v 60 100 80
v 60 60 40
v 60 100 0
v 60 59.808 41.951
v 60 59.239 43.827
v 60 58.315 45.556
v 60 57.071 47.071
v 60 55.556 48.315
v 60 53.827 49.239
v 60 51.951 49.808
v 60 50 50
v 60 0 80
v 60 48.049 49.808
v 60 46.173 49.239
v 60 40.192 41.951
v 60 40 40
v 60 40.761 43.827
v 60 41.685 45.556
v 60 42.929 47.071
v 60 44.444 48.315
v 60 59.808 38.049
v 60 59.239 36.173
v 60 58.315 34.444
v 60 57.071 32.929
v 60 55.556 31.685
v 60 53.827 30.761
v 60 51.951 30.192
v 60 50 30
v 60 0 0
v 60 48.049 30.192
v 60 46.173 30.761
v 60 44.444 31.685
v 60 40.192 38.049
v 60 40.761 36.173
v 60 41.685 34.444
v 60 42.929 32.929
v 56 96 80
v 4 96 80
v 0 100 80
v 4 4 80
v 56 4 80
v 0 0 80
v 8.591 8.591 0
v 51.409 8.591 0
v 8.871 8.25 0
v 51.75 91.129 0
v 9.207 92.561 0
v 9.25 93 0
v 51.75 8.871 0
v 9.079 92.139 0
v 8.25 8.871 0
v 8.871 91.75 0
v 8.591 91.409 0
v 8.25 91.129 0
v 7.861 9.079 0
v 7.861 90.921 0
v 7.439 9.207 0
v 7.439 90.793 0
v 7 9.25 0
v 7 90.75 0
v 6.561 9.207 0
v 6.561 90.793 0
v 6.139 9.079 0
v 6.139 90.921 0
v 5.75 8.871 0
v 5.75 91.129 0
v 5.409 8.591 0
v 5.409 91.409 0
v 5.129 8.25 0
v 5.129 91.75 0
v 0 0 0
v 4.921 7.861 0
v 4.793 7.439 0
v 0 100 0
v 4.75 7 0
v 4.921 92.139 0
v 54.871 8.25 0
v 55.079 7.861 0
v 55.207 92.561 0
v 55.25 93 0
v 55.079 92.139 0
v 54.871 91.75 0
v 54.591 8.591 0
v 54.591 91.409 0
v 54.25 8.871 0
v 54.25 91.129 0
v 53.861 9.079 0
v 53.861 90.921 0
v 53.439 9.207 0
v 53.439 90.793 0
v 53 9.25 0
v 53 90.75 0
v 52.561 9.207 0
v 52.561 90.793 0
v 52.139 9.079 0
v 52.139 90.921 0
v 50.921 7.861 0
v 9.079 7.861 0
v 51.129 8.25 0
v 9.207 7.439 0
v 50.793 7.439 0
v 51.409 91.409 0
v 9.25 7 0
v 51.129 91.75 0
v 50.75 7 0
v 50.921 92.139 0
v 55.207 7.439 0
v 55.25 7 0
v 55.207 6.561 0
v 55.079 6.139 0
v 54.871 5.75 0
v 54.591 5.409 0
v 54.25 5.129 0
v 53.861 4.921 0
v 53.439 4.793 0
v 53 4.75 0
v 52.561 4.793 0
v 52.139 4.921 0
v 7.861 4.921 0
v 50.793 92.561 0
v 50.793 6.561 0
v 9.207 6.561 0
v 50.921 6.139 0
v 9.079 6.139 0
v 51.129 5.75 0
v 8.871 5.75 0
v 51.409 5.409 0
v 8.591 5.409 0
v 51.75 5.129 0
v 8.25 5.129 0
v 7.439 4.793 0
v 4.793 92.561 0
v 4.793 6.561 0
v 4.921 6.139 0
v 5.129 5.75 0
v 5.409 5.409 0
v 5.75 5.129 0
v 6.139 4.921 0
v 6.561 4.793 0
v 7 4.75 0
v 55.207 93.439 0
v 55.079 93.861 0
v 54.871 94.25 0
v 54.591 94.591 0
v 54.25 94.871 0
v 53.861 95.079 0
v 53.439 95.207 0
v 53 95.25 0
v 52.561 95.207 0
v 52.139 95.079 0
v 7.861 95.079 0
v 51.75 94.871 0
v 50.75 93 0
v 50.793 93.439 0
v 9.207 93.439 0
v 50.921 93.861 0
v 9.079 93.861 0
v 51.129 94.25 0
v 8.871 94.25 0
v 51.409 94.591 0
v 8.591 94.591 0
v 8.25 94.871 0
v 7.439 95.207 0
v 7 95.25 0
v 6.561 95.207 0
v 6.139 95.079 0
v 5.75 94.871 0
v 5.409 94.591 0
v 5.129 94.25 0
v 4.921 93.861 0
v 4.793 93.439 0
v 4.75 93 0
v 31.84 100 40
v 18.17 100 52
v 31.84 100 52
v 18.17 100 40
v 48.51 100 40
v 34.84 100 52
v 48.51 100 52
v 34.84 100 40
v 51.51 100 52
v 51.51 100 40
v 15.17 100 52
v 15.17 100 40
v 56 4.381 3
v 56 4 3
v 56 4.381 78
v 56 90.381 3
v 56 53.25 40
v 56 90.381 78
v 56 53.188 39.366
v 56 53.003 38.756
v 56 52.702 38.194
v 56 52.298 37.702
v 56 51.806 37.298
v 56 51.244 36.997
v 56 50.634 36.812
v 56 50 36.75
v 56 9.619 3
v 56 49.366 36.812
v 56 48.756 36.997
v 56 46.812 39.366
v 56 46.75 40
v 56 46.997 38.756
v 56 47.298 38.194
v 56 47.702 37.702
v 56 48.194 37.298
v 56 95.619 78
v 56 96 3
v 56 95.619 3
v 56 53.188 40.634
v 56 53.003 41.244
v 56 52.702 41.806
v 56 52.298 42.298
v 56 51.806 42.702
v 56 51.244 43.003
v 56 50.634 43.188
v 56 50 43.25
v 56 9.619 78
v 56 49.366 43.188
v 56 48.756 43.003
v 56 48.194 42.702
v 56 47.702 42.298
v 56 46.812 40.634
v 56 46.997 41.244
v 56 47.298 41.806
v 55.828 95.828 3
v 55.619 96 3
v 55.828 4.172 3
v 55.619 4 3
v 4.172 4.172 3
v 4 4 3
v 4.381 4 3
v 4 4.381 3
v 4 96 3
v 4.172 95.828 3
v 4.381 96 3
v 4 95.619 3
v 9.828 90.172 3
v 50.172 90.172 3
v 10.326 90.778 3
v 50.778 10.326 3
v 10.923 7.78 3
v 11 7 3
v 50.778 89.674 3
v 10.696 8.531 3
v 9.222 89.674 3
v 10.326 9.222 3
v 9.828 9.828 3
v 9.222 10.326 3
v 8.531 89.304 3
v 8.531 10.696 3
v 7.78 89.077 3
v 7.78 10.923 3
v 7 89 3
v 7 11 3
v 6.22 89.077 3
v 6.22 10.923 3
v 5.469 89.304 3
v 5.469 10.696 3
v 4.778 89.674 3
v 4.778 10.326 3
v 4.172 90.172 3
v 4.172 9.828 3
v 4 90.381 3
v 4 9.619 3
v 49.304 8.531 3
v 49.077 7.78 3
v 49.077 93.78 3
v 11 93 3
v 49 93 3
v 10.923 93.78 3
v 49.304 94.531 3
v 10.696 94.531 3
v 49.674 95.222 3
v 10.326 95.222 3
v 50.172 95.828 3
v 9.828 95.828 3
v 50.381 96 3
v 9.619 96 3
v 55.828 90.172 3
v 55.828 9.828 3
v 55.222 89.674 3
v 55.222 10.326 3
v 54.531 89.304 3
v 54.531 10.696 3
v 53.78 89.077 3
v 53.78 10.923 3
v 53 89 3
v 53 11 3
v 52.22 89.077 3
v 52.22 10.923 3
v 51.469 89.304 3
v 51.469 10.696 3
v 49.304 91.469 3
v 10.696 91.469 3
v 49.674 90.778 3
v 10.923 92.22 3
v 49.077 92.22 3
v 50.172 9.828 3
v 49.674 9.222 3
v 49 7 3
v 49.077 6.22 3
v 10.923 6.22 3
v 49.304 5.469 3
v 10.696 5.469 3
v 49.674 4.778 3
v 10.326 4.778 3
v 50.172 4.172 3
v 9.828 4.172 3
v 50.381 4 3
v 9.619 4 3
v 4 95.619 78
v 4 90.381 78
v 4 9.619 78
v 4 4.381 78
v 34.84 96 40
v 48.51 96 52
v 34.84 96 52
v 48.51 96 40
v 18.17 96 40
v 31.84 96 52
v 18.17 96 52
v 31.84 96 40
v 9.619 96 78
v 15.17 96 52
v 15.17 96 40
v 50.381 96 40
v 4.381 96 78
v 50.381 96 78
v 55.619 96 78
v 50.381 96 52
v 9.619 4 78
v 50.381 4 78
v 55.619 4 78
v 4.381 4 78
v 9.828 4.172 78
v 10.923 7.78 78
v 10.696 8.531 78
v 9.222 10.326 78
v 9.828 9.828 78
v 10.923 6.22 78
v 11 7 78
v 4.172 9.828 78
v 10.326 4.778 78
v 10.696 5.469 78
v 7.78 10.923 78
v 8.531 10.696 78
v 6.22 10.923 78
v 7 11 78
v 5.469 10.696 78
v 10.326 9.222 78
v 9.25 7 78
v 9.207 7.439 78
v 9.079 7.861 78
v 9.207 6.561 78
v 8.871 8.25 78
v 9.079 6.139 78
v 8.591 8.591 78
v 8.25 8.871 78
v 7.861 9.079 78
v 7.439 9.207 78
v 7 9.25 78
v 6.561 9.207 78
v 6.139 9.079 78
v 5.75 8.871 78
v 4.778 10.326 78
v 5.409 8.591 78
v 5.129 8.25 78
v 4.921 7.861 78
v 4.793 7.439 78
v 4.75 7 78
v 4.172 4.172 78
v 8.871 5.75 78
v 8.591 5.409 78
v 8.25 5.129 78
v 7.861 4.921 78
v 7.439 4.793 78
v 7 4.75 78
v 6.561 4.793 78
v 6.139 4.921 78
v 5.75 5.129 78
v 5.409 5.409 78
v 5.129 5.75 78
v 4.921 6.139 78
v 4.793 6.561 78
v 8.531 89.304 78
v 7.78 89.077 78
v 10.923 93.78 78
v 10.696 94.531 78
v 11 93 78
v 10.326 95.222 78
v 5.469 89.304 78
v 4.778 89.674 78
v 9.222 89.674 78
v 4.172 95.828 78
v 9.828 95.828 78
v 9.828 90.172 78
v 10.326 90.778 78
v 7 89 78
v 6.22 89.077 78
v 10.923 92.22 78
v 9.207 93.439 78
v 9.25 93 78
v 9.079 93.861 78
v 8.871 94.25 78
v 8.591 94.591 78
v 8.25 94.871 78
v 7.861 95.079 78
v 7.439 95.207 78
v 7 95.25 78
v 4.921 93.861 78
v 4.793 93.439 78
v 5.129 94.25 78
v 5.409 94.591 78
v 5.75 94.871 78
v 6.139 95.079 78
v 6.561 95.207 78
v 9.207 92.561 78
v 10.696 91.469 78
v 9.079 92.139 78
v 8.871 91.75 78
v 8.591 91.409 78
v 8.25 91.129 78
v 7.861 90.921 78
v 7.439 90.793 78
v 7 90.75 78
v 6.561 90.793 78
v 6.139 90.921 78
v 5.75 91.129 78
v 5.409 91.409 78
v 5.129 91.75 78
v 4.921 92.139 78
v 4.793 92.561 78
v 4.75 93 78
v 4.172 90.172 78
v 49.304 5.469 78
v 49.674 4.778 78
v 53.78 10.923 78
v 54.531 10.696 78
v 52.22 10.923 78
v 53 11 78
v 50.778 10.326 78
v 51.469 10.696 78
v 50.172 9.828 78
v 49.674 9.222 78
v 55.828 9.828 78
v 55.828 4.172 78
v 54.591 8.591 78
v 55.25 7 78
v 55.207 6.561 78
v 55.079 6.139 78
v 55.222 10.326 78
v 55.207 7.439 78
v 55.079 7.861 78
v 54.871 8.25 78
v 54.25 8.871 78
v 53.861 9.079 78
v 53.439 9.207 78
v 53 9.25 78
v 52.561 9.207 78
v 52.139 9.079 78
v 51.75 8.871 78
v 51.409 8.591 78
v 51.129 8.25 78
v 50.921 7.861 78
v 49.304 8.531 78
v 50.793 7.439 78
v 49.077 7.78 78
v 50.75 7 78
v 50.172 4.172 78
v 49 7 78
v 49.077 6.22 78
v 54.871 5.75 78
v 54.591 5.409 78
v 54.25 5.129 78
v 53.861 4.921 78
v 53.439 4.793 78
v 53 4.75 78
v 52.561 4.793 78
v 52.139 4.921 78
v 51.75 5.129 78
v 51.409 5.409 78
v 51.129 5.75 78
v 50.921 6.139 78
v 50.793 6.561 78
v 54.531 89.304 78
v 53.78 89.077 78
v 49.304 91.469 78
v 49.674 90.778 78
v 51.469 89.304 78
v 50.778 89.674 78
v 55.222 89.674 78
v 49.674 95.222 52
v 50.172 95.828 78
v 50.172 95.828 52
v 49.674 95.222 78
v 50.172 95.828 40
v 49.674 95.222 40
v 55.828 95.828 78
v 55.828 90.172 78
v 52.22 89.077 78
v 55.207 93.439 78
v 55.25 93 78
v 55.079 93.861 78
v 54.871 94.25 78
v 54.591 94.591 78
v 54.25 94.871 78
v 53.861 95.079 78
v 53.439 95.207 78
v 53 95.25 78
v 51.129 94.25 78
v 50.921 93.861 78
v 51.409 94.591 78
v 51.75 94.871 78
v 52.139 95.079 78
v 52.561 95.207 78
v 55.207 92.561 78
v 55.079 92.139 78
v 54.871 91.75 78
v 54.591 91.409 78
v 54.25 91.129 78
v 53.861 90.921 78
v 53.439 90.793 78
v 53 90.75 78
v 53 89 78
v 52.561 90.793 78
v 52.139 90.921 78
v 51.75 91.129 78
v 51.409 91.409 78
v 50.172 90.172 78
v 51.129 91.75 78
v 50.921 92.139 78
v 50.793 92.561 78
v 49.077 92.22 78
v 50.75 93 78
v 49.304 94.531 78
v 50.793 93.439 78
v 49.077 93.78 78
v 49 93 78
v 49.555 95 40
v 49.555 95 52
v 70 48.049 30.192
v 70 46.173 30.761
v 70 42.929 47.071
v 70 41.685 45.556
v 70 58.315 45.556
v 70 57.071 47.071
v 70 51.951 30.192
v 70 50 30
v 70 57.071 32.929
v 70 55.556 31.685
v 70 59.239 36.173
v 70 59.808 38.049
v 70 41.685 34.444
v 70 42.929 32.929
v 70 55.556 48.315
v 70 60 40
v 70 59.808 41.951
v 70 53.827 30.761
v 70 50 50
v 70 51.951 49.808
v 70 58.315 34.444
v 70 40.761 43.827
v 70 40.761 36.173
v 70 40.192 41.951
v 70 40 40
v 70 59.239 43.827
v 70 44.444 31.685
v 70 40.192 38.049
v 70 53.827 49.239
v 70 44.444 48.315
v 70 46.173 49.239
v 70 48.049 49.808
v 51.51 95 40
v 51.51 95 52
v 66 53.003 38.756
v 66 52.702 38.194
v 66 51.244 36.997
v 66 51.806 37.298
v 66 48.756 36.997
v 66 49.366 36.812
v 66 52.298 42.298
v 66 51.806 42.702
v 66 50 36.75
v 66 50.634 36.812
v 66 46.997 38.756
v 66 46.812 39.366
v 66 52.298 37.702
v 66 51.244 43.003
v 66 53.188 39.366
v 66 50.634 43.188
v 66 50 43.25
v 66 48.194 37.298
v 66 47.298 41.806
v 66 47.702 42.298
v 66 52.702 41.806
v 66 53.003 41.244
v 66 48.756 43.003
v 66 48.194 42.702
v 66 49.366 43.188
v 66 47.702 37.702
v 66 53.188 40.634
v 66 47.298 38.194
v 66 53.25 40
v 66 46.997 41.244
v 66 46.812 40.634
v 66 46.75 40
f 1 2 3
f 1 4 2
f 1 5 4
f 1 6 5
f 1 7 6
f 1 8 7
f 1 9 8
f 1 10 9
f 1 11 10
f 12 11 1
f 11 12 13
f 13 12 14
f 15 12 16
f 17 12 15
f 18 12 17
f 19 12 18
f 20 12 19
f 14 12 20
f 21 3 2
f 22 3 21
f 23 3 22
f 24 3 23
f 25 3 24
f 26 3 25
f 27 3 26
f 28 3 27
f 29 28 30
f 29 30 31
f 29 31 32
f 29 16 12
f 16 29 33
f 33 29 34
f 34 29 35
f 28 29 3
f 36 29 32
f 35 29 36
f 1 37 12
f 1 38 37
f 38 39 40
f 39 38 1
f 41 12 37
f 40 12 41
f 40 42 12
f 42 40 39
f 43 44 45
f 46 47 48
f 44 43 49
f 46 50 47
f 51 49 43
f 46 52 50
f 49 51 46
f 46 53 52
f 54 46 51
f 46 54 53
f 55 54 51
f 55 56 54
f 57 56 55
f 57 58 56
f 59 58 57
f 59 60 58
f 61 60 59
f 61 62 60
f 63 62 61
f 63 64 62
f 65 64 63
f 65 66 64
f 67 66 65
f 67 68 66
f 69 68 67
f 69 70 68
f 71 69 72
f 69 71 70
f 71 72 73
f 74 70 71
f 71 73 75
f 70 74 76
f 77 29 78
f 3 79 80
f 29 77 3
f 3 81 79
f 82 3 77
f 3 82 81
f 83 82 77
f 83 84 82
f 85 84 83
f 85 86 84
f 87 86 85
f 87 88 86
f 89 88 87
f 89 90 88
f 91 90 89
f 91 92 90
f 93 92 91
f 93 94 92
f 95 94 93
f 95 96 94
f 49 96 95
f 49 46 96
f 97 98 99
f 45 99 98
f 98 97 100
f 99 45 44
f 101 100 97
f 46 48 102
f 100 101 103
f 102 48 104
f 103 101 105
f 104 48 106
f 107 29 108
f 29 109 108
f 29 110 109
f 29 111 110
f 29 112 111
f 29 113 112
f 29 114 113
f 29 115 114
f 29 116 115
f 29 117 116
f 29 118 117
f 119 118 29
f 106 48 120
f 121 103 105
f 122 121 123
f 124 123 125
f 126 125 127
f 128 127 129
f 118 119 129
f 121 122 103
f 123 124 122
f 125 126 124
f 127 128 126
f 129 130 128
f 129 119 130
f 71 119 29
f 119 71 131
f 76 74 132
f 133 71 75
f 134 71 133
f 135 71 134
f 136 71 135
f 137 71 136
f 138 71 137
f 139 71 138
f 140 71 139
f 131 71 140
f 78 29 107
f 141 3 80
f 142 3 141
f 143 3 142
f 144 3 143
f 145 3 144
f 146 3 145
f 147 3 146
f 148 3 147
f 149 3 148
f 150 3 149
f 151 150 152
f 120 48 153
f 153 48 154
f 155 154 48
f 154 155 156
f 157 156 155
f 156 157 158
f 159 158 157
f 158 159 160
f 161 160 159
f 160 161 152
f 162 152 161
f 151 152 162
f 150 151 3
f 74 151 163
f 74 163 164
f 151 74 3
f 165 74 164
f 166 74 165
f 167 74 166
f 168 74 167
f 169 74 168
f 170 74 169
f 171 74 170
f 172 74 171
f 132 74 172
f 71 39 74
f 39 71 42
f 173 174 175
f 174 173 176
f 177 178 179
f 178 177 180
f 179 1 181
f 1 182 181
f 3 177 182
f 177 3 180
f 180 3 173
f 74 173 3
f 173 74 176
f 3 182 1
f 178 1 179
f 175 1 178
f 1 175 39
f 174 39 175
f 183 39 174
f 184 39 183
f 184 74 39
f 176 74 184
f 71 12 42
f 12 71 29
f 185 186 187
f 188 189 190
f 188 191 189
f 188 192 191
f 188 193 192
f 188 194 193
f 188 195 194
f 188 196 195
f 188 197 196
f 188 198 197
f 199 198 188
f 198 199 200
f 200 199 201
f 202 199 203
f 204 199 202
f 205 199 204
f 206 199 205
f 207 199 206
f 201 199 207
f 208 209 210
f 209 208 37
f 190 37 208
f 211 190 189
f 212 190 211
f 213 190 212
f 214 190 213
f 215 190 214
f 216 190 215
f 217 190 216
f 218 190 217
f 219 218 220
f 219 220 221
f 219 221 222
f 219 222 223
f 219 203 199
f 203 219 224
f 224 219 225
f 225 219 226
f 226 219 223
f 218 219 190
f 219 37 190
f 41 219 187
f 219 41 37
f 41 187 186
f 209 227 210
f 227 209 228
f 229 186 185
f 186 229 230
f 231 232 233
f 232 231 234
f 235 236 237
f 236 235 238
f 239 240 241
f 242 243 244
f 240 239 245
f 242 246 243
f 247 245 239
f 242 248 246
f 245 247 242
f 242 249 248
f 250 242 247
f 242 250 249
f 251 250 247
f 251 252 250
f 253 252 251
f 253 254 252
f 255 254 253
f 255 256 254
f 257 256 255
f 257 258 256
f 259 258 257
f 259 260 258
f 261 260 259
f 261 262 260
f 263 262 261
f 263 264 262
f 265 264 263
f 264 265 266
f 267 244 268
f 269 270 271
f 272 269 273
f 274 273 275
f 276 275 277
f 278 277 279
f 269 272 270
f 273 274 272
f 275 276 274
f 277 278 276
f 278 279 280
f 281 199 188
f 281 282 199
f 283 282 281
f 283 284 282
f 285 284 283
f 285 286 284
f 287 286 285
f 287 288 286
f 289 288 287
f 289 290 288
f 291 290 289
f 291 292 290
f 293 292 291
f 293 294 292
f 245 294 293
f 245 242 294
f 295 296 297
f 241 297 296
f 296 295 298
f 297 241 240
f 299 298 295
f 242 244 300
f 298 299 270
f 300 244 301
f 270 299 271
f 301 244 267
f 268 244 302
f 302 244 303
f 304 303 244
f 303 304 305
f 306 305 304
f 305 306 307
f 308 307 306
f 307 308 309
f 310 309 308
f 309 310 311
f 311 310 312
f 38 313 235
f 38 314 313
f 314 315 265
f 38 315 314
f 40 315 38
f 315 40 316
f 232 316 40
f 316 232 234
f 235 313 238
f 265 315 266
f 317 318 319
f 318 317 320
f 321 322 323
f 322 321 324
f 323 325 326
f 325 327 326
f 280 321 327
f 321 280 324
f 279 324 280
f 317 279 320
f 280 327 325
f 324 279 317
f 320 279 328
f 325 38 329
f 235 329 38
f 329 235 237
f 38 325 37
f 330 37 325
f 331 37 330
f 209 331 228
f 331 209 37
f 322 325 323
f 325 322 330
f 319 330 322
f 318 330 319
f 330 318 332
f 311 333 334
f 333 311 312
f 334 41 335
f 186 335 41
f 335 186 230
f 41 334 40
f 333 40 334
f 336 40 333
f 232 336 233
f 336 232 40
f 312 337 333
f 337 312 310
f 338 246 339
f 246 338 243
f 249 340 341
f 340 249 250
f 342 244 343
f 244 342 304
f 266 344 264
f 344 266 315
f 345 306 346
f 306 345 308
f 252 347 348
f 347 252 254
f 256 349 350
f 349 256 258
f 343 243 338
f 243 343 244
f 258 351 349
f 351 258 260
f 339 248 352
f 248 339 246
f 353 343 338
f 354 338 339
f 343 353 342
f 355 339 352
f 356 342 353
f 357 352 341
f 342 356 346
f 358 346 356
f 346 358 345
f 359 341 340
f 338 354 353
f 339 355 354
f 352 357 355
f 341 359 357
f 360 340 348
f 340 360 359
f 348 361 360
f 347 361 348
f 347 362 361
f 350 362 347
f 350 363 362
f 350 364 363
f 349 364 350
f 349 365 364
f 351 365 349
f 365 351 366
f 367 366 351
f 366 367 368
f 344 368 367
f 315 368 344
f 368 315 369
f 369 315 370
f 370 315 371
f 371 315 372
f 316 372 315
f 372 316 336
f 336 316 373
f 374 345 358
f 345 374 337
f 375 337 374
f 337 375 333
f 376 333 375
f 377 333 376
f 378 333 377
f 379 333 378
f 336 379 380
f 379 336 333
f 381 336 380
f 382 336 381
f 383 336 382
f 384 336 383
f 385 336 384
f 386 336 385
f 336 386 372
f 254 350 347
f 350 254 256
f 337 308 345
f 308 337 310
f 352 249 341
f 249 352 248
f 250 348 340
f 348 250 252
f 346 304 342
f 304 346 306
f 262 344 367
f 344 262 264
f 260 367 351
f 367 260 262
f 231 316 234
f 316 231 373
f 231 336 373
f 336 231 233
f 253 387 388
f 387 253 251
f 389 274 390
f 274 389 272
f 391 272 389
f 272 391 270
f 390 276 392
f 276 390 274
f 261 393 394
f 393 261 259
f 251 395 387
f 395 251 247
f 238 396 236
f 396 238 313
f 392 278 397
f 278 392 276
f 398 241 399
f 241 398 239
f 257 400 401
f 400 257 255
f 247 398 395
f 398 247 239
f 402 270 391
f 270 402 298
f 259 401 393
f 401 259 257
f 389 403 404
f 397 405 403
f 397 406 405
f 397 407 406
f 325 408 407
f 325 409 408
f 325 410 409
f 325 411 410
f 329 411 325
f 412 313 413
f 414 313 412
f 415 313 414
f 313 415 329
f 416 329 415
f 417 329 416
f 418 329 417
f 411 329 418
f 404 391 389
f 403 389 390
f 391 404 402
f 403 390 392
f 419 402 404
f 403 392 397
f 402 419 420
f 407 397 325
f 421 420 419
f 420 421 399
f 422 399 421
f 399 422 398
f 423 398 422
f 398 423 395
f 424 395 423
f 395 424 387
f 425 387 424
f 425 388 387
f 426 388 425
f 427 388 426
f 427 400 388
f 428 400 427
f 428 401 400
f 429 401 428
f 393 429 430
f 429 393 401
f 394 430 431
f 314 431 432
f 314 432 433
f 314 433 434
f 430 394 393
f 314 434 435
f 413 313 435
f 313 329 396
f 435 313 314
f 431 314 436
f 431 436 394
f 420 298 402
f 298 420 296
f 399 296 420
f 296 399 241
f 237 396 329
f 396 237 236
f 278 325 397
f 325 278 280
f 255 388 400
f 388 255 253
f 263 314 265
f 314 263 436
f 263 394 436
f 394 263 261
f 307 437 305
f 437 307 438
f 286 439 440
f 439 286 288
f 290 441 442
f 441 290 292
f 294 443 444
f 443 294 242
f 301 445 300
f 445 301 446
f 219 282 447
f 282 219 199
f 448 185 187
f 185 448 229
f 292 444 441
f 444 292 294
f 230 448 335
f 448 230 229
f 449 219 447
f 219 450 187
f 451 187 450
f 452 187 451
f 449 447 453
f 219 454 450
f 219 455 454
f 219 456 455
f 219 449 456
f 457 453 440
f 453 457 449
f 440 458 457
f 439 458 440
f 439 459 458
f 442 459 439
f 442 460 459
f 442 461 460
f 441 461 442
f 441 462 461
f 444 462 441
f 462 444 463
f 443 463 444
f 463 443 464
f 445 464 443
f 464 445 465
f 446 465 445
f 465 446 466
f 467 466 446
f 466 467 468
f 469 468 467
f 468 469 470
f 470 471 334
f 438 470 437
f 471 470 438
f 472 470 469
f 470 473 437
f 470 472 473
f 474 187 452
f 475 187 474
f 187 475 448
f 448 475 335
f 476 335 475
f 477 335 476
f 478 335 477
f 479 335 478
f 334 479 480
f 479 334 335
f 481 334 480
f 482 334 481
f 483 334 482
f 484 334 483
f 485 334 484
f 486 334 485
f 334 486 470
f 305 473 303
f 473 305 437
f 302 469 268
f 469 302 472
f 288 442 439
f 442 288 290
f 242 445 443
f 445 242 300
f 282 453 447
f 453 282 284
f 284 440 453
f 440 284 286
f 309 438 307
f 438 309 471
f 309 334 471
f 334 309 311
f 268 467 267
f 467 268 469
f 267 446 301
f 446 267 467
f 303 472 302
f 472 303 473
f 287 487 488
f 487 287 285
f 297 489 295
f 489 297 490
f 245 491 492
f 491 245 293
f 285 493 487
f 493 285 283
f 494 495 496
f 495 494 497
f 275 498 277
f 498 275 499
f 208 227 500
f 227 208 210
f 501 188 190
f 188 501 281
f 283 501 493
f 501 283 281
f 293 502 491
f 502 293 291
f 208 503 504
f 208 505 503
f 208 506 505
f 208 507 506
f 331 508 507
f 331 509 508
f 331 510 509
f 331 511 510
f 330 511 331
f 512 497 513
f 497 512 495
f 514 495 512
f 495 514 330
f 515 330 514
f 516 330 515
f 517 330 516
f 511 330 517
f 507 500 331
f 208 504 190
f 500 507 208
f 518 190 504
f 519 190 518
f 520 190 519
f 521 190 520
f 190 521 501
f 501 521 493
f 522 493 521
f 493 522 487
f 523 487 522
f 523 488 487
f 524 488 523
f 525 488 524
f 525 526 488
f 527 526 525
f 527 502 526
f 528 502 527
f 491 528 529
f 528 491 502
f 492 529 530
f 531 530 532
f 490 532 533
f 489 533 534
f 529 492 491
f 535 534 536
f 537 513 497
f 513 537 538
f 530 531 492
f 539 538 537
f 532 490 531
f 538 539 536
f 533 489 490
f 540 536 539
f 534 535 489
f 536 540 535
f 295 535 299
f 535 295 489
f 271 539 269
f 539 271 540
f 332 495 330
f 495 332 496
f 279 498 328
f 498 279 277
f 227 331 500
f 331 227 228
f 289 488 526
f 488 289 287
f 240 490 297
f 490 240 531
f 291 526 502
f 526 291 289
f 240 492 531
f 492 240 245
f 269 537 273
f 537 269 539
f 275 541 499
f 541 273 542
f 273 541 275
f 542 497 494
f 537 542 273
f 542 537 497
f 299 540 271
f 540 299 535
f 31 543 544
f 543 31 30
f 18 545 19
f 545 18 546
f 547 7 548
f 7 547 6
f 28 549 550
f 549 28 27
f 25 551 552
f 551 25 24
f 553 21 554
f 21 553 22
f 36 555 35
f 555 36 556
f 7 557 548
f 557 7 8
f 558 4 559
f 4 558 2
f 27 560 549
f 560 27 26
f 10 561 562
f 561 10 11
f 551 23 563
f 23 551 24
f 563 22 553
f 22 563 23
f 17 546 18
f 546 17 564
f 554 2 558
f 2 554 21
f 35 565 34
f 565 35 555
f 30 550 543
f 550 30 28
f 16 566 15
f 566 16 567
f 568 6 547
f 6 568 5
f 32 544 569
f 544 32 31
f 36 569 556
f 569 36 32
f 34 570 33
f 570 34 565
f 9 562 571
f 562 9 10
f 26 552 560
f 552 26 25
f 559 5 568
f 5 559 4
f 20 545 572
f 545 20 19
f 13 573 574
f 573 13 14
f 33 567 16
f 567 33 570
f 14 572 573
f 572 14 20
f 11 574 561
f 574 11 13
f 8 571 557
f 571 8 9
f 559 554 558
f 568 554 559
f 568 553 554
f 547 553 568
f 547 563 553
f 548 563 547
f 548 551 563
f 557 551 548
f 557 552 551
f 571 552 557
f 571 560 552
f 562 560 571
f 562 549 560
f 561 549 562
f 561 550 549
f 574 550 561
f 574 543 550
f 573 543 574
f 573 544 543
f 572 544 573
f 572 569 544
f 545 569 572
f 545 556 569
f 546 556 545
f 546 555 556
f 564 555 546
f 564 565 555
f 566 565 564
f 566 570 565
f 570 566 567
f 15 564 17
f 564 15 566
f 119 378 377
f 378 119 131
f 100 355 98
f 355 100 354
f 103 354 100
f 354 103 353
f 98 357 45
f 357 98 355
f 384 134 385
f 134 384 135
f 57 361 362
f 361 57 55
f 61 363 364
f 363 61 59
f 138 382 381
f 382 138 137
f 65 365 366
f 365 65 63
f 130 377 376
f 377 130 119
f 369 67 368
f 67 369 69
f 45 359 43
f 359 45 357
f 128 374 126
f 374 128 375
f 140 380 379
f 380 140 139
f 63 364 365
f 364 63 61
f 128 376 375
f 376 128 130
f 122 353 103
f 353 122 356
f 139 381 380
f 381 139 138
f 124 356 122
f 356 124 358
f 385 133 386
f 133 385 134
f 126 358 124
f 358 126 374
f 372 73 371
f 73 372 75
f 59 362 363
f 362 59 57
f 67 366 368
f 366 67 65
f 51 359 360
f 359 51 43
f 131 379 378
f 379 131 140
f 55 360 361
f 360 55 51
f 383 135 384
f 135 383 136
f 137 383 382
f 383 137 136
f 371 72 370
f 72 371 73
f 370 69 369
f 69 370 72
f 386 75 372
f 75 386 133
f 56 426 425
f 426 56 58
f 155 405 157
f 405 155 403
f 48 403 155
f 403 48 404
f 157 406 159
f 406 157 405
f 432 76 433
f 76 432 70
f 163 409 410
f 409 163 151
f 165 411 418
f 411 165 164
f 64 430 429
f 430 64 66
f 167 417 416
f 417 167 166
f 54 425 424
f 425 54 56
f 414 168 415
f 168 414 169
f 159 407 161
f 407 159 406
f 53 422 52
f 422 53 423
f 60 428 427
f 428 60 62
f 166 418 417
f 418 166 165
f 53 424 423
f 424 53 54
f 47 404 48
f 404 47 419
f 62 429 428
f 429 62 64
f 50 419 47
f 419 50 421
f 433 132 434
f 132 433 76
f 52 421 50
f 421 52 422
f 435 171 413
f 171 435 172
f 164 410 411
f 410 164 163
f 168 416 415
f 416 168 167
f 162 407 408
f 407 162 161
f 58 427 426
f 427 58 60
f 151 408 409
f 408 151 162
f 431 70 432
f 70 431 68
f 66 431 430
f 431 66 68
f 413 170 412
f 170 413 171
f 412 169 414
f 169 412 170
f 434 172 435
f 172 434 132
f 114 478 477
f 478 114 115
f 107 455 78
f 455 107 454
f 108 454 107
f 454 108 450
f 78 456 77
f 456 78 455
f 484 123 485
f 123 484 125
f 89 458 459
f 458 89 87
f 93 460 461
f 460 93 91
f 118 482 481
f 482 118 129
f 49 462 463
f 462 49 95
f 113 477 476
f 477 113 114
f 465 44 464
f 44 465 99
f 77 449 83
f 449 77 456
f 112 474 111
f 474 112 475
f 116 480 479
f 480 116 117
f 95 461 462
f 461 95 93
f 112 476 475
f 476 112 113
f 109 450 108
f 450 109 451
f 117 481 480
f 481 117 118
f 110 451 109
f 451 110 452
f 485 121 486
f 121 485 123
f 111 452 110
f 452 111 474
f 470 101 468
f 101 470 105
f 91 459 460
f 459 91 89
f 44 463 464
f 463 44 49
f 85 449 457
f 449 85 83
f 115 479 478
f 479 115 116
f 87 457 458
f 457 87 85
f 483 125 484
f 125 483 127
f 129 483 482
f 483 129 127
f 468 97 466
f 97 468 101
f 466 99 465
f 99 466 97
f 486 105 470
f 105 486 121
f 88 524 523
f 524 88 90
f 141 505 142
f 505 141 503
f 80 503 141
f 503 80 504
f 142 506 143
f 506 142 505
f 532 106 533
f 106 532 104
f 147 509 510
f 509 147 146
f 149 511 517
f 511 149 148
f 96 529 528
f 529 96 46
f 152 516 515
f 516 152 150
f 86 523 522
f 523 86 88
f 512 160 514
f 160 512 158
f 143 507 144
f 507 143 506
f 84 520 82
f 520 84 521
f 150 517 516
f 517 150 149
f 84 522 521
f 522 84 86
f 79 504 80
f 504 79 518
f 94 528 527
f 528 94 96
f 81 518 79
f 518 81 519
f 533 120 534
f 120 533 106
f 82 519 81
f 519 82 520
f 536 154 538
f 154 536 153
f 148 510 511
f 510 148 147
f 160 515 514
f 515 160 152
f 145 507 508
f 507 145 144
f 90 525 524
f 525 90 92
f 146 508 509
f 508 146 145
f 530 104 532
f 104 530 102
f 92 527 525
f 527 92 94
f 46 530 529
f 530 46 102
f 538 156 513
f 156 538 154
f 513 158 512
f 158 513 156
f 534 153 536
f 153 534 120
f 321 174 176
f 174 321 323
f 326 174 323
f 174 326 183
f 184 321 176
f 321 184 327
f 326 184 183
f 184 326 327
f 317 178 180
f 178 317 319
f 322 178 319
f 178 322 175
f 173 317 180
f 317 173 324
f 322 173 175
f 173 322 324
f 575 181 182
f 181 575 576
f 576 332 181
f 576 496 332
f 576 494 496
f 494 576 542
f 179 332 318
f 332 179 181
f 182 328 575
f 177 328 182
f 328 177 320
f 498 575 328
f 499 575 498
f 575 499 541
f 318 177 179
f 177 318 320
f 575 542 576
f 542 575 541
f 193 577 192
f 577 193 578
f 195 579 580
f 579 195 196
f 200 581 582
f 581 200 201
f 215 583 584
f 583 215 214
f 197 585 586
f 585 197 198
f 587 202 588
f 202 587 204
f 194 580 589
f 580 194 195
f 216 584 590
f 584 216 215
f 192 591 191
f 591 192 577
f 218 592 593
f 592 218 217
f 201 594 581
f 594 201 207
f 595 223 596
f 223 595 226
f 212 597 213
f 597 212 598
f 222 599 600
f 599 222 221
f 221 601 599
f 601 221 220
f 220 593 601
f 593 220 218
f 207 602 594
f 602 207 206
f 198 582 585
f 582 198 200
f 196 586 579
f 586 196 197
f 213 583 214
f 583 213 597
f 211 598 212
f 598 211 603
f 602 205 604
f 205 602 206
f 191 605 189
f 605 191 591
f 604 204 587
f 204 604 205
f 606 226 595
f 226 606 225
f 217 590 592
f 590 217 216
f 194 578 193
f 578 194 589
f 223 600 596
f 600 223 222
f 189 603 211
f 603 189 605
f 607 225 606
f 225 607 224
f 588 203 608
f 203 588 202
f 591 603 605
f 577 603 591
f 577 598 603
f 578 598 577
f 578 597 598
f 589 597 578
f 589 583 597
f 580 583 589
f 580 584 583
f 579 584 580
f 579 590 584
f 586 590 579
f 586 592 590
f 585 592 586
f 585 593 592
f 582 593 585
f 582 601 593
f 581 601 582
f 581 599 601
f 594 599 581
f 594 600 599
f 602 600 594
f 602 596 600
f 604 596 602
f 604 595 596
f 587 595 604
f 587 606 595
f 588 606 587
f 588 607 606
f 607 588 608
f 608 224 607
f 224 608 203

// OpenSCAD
$fn = 32;

// ----------------------------------------------------------------------
// Enclosure body: 60 x 100 x 80 mm, wall 4 mm
// ----------------------------------------------------------------------

// --- parameters (mm) ---
length = 60;              // outside length, X
width = 100;              // outside width, Y
height = 80;              // outside height, Z
wall = 4;                 // side wall thickness
floor_t = 3;              // floor thickness
boss_d = 8;               // corner boss diameter
boss_h = 75;              // corner boss height above the floor
boss_hole_d = 4.5;        // lid screw clearance in the boss
boss_lip = 7;             // boss centre inset from the corner
vent_slots = 5;           // vent slots in the long wall
vent_w = 3;               // vent slot width
vent_h = 12;              // vent slot height
vent_pitch = 16.67;       // vent slot pitch
vent_z = 40;              // vent slot sill height
nipple_d = 20;            // cable gland boss diameter
nipple_h = 10;            // cable gland boss height
nipple_bore = 6.5;        // cable gland bore

module shell() {
  difference() {
    cube([length, width, height]);
    /* hollow, open at the top */
    translate([wall, wall, floor_t])
      cube([length - 2 * wall, width - 2 * wall, height]);
  }
}

module bosses() {
  /* corner bosses, sunk 1 mm into the floor */
  for (sx = [0, 1]) for (sy = [0, 1])
    translate([sx * (length - 2 * boss_lip) + boss_lip, sy * (width - 2 * boss_lip) + boss_lip, floor_t - 1])
      cylinder(h = boss_h + 1, d = boss_d);
}

module gland() {
  /* boss on the short wall, sunk 1 mm into it */
  translate([length - 1, width / 2, height * 0.5]) rotate([0, 90, 0])
    cylinder(h = nipple_h + 1, d = nipple_d);
}

difference() {
  union() {
    shell();
    bosses();
    gland();
  }
  /* boss screw holes */
  for (sx = [0, 1]) for (sy = [0, 1])
    translate([sx * (length - 2 * boss_lip) + boss_lip, sy * (width - 2 * boss_lip) + boss_lip, -1]) cylinder(h = floor_t + boss_h + 2, d = boss_hole_d);
  /* vent grille in the +Y wall */
  for (i = [0 : vent_slots - 1]) translate([vent_pitch * (i + 1) - vent_w / 2, width - wall - 1, vent_z]) cube([vent_w, wall + 2, vent_h]);
  translate([length, width / 2, height * 0.5]) rotate([0, 90, 0]) translate([0, 0, -nipple_h - 2]) cylinder(h = nipple_h + wall + 4, d = nipple_bore);
}
